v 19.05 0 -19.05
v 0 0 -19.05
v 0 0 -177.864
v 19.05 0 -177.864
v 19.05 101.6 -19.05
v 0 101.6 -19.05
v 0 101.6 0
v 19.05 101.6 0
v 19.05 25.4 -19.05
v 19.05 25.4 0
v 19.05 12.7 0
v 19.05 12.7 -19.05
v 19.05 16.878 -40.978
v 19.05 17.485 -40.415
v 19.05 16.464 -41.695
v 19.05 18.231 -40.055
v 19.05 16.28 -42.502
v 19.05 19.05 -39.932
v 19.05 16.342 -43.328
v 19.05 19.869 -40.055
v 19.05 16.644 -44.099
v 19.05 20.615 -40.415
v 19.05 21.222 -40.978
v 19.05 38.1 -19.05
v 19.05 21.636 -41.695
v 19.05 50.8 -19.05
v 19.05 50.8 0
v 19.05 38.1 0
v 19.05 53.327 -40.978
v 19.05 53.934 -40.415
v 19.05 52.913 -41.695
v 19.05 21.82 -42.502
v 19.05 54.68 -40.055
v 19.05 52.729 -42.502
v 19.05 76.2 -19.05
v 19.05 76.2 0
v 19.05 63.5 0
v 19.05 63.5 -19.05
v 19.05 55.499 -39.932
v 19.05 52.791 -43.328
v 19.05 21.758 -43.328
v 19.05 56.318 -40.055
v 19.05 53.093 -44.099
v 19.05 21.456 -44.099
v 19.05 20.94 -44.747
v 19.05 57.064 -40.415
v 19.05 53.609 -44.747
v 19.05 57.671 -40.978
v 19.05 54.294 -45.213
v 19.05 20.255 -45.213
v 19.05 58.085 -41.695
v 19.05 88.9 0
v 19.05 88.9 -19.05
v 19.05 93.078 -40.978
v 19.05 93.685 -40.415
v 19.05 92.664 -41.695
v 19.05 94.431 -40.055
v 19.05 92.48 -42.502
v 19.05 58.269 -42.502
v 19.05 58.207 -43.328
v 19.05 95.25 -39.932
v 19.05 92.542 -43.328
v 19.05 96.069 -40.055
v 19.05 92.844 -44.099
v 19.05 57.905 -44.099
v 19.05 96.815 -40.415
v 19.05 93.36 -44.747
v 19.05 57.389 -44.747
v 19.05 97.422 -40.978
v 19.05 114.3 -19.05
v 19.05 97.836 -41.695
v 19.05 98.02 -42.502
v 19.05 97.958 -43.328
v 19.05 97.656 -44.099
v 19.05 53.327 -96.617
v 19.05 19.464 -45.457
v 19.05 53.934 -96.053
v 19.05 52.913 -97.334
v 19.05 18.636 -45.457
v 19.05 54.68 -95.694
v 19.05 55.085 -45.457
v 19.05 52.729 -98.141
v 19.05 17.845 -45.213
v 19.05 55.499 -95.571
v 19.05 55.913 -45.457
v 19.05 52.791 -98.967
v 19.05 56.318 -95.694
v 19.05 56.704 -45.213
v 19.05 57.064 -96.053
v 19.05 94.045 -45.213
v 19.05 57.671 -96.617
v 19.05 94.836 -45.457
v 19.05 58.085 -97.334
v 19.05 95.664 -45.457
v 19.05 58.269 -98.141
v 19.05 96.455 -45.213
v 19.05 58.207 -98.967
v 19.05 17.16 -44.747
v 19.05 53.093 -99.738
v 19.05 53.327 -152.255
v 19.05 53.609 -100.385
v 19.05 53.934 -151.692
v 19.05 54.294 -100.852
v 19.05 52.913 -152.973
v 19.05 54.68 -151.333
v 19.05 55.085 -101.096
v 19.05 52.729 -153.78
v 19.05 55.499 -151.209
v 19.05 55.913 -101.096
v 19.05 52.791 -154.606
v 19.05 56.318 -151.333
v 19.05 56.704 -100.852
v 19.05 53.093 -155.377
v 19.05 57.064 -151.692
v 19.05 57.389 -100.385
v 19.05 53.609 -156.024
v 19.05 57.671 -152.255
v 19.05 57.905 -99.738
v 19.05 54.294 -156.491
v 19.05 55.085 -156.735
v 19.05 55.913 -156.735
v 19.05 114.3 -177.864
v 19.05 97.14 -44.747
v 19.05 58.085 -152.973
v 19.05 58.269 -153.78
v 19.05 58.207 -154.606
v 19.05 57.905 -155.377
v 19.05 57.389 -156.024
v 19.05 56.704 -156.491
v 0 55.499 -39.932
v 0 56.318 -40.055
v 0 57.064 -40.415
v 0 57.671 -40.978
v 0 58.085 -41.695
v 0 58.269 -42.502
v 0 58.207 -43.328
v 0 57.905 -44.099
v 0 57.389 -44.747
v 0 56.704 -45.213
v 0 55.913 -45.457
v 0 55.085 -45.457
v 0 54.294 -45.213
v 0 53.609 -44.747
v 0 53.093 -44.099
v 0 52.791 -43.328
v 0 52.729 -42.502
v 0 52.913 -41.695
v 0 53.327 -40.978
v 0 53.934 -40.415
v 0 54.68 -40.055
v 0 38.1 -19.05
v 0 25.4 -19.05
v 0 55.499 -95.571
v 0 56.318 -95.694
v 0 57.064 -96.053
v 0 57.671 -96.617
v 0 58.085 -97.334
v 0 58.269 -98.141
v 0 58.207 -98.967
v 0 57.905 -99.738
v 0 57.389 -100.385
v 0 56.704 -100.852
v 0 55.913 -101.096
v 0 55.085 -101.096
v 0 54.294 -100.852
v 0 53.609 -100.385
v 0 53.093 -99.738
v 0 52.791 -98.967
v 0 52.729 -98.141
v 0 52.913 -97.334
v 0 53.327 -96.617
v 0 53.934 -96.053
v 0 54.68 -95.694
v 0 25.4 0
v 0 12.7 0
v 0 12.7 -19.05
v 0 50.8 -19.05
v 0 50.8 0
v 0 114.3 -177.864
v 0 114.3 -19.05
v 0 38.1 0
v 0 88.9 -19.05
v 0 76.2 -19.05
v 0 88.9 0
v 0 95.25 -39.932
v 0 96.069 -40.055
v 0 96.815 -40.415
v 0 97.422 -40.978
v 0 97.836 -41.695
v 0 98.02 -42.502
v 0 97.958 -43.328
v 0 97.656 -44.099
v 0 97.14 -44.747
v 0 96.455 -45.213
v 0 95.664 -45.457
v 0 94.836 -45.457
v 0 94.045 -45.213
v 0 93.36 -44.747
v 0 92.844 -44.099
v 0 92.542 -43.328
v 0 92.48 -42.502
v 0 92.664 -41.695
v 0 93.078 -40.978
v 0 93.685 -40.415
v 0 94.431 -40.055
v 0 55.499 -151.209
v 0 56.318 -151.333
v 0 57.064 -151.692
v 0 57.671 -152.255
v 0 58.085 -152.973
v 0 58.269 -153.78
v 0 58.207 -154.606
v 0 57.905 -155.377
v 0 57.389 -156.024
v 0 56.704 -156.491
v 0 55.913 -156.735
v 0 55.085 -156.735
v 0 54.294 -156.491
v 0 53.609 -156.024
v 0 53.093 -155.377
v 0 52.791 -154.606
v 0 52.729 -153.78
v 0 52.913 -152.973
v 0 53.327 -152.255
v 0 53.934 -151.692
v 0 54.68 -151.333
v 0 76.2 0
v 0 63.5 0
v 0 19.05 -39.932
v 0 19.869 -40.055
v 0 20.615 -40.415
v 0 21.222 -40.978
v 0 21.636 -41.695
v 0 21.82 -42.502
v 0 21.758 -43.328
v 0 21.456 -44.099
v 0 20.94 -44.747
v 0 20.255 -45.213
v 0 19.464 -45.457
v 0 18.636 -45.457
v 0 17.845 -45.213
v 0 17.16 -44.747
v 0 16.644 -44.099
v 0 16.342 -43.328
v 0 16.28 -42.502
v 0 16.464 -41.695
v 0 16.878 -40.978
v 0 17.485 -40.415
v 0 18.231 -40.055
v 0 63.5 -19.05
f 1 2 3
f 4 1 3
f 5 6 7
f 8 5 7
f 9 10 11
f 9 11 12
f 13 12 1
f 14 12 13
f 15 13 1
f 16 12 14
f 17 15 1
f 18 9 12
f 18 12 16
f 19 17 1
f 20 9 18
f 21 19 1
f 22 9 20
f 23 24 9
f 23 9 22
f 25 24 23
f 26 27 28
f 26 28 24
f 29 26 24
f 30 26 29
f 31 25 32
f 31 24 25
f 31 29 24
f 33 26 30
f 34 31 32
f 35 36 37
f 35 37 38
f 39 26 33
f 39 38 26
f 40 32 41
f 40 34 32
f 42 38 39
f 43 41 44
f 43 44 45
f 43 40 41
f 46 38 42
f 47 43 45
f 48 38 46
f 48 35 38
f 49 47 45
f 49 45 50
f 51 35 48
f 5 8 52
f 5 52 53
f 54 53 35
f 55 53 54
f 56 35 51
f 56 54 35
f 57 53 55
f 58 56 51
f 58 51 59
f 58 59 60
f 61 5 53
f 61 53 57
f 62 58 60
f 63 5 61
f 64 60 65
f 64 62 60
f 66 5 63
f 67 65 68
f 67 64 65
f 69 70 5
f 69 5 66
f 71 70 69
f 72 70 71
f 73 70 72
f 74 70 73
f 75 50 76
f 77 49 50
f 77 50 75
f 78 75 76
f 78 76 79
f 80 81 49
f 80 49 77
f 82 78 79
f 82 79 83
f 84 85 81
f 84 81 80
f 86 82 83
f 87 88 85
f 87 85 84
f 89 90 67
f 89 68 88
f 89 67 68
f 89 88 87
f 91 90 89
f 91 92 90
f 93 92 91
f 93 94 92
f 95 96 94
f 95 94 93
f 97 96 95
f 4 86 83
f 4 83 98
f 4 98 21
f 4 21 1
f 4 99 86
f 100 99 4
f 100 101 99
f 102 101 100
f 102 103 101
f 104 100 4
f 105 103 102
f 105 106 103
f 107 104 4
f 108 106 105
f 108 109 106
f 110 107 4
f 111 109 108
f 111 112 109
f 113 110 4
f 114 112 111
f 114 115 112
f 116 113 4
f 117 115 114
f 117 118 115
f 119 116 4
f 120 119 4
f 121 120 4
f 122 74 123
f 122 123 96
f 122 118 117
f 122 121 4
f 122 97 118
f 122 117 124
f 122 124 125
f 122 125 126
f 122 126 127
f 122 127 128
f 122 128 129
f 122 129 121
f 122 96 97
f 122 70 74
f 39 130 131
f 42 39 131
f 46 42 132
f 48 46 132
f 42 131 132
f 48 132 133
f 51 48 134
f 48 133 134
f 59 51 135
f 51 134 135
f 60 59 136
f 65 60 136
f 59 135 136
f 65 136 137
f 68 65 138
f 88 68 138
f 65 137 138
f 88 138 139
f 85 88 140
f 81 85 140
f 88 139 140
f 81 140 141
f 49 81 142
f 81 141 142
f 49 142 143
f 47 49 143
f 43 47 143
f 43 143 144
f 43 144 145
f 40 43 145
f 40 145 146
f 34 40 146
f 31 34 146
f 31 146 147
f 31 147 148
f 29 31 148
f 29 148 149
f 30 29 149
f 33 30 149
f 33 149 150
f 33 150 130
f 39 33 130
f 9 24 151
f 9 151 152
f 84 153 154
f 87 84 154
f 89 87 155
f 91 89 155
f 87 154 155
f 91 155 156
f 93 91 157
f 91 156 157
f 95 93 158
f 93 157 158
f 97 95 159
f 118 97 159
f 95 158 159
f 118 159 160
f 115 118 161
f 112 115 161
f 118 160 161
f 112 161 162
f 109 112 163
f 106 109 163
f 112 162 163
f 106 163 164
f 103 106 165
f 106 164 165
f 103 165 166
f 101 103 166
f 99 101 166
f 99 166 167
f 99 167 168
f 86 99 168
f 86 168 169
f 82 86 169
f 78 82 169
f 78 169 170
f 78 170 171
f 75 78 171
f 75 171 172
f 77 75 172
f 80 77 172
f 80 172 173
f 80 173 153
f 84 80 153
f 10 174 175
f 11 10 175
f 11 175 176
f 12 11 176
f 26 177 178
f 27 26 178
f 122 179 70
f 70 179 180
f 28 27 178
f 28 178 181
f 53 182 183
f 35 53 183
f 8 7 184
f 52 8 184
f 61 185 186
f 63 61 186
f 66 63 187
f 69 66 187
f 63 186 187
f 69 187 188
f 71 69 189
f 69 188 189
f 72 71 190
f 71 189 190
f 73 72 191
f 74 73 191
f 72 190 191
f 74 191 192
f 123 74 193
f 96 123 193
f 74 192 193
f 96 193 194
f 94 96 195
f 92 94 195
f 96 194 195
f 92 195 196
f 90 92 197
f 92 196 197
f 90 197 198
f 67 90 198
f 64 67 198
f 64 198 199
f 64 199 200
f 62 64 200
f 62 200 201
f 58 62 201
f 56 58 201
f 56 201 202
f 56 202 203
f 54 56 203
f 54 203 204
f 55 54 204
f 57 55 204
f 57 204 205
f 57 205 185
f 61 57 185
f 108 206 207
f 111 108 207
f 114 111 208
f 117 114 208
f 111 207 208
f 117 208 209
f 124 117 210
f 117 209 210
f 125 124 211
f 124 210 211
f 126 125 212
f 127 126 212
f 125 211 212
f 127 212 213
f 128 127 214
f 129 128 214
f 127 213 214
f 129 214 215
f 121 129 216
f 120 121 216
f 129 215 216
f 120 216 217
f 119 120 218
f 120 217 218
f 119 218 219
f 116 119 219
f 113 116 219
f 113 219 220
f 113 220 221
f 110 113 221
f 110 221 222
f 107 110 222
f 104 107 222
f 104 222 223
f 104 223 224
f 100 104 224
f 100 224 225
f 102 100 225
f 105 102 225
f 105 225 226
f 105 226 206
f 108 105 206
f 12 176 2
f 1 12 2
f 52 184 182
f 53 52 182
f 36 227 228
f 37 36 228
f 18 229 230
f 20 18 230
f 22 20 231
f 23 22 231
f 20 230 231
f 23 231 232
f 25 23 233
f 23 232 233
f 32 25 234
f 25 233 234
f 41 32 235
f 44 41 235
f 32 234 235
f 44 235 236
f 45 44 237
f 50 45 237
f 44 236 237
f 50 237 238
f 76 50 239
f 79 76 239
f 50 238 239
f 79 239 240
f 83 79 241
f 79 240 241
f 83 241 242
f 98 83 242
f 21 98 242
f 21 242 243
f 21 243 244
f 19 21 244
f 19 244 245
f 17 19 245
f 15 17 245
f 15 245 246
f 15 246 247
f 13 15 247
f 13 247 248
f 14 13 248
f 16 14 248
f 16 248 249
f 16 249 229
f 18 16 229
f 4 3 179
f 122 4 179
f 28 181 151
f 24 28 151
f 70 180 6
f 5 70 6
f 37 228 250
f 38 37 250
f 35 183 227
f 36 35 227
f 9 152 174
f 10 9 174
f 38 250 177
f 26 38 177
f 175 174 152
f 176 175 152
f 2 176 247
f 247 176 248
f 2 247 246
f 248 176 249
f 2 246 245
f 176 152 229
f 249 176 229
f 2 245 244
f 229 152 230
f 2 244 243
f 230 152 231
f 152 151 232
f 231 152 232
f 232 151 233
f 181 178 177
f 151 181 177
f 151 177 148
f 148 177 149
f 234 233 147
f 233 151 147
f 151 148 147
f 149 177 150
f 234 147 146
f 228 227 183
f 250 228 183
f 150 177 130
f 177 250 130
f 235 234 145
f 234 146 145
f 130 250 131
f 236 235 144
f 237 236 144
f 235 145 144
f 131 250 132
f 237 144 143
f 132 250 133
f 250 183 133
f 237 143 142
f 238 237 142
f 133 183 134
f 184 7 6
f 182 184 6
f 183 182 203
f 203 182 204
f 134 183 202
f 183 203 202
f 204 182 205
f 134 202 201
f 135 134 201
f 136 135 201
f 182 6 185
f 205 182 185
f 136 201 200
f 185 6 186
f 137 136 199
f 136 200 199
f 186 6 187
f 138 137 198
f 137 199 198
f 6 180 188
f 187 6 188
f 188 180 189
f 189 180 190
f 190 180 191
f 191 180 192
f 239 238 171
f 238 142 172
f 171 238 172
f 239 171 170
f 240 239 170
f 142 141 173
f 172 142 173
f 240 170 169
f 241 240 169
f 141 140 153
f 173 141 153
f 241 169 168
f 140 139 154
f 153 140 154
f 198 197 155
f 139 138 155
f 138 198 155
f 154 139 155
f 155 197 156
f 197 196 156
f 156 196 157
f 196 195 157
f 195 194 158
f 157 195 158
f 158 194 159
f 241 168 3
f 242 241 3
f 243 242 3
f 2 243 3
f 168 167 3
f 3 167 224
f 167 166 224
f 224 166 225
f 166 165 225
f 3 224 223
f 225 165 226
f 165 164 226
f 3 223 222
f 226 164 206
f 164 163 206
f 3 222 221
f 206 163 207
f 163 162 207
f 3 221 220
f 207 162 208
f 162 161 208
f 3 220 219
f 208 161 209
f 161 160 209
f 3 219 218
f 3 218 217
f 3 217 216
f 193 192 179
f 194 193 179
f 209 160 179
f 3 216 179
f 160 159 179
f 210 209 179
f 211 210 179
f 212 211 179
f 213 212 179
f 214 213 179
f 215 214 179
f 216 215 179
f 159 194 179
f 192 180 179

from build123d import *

# Parameters (mm, degrees)
BOSS_EXTRUDE1_DEPTH             = 19.05
F_7_32_0_21875_DIAMETER_HOLE3_D = 5.55625


with BuildPart() as part:
    # Sketch1 → Boss-Extrude1 (new body)
    with BuildSketch(Plane(origin=(0, 0, 0), x_dir=(0, 0, -1), z_dir=(1, 0, 0))):
        Polygon((19.05, 0), (177.8635, 0), (177.8635, 114.3), (19.05, 114.3), (19.05, 101.6), (0, 101.6), (0, 88.9), (19.05, 88.9), (19.05, 76.2), (0, 76.2), (0, 63.5), (19.05, 63.5), (19.05, 50.8), (0, 50.8), (0, 38.1), (19.05, 38.1), (19.05, 25.4), (0, 25.4), (0, 12.7), (19.05, 12.7), align=None)
    extrude(amount=BOSS_EXTRUDE1_DEPTH)

    # 7/32 (0.21875) Diameter Hole3 (through all)
    with Locations(Plane(origin=(19.05, 0, 0), x_dir=(0, 0, -1), z_dir=(1, 0, 0))):
        with Locations((42.7101, 19.05), (153.9875, 55.499), (98.3488, 55.499), (42.7101, 55.499), (42.7101, 95.25)):
            Hole(F_7_32_0_21875_DIAMETER_HOLE3_D / 2)


solid = part.part
